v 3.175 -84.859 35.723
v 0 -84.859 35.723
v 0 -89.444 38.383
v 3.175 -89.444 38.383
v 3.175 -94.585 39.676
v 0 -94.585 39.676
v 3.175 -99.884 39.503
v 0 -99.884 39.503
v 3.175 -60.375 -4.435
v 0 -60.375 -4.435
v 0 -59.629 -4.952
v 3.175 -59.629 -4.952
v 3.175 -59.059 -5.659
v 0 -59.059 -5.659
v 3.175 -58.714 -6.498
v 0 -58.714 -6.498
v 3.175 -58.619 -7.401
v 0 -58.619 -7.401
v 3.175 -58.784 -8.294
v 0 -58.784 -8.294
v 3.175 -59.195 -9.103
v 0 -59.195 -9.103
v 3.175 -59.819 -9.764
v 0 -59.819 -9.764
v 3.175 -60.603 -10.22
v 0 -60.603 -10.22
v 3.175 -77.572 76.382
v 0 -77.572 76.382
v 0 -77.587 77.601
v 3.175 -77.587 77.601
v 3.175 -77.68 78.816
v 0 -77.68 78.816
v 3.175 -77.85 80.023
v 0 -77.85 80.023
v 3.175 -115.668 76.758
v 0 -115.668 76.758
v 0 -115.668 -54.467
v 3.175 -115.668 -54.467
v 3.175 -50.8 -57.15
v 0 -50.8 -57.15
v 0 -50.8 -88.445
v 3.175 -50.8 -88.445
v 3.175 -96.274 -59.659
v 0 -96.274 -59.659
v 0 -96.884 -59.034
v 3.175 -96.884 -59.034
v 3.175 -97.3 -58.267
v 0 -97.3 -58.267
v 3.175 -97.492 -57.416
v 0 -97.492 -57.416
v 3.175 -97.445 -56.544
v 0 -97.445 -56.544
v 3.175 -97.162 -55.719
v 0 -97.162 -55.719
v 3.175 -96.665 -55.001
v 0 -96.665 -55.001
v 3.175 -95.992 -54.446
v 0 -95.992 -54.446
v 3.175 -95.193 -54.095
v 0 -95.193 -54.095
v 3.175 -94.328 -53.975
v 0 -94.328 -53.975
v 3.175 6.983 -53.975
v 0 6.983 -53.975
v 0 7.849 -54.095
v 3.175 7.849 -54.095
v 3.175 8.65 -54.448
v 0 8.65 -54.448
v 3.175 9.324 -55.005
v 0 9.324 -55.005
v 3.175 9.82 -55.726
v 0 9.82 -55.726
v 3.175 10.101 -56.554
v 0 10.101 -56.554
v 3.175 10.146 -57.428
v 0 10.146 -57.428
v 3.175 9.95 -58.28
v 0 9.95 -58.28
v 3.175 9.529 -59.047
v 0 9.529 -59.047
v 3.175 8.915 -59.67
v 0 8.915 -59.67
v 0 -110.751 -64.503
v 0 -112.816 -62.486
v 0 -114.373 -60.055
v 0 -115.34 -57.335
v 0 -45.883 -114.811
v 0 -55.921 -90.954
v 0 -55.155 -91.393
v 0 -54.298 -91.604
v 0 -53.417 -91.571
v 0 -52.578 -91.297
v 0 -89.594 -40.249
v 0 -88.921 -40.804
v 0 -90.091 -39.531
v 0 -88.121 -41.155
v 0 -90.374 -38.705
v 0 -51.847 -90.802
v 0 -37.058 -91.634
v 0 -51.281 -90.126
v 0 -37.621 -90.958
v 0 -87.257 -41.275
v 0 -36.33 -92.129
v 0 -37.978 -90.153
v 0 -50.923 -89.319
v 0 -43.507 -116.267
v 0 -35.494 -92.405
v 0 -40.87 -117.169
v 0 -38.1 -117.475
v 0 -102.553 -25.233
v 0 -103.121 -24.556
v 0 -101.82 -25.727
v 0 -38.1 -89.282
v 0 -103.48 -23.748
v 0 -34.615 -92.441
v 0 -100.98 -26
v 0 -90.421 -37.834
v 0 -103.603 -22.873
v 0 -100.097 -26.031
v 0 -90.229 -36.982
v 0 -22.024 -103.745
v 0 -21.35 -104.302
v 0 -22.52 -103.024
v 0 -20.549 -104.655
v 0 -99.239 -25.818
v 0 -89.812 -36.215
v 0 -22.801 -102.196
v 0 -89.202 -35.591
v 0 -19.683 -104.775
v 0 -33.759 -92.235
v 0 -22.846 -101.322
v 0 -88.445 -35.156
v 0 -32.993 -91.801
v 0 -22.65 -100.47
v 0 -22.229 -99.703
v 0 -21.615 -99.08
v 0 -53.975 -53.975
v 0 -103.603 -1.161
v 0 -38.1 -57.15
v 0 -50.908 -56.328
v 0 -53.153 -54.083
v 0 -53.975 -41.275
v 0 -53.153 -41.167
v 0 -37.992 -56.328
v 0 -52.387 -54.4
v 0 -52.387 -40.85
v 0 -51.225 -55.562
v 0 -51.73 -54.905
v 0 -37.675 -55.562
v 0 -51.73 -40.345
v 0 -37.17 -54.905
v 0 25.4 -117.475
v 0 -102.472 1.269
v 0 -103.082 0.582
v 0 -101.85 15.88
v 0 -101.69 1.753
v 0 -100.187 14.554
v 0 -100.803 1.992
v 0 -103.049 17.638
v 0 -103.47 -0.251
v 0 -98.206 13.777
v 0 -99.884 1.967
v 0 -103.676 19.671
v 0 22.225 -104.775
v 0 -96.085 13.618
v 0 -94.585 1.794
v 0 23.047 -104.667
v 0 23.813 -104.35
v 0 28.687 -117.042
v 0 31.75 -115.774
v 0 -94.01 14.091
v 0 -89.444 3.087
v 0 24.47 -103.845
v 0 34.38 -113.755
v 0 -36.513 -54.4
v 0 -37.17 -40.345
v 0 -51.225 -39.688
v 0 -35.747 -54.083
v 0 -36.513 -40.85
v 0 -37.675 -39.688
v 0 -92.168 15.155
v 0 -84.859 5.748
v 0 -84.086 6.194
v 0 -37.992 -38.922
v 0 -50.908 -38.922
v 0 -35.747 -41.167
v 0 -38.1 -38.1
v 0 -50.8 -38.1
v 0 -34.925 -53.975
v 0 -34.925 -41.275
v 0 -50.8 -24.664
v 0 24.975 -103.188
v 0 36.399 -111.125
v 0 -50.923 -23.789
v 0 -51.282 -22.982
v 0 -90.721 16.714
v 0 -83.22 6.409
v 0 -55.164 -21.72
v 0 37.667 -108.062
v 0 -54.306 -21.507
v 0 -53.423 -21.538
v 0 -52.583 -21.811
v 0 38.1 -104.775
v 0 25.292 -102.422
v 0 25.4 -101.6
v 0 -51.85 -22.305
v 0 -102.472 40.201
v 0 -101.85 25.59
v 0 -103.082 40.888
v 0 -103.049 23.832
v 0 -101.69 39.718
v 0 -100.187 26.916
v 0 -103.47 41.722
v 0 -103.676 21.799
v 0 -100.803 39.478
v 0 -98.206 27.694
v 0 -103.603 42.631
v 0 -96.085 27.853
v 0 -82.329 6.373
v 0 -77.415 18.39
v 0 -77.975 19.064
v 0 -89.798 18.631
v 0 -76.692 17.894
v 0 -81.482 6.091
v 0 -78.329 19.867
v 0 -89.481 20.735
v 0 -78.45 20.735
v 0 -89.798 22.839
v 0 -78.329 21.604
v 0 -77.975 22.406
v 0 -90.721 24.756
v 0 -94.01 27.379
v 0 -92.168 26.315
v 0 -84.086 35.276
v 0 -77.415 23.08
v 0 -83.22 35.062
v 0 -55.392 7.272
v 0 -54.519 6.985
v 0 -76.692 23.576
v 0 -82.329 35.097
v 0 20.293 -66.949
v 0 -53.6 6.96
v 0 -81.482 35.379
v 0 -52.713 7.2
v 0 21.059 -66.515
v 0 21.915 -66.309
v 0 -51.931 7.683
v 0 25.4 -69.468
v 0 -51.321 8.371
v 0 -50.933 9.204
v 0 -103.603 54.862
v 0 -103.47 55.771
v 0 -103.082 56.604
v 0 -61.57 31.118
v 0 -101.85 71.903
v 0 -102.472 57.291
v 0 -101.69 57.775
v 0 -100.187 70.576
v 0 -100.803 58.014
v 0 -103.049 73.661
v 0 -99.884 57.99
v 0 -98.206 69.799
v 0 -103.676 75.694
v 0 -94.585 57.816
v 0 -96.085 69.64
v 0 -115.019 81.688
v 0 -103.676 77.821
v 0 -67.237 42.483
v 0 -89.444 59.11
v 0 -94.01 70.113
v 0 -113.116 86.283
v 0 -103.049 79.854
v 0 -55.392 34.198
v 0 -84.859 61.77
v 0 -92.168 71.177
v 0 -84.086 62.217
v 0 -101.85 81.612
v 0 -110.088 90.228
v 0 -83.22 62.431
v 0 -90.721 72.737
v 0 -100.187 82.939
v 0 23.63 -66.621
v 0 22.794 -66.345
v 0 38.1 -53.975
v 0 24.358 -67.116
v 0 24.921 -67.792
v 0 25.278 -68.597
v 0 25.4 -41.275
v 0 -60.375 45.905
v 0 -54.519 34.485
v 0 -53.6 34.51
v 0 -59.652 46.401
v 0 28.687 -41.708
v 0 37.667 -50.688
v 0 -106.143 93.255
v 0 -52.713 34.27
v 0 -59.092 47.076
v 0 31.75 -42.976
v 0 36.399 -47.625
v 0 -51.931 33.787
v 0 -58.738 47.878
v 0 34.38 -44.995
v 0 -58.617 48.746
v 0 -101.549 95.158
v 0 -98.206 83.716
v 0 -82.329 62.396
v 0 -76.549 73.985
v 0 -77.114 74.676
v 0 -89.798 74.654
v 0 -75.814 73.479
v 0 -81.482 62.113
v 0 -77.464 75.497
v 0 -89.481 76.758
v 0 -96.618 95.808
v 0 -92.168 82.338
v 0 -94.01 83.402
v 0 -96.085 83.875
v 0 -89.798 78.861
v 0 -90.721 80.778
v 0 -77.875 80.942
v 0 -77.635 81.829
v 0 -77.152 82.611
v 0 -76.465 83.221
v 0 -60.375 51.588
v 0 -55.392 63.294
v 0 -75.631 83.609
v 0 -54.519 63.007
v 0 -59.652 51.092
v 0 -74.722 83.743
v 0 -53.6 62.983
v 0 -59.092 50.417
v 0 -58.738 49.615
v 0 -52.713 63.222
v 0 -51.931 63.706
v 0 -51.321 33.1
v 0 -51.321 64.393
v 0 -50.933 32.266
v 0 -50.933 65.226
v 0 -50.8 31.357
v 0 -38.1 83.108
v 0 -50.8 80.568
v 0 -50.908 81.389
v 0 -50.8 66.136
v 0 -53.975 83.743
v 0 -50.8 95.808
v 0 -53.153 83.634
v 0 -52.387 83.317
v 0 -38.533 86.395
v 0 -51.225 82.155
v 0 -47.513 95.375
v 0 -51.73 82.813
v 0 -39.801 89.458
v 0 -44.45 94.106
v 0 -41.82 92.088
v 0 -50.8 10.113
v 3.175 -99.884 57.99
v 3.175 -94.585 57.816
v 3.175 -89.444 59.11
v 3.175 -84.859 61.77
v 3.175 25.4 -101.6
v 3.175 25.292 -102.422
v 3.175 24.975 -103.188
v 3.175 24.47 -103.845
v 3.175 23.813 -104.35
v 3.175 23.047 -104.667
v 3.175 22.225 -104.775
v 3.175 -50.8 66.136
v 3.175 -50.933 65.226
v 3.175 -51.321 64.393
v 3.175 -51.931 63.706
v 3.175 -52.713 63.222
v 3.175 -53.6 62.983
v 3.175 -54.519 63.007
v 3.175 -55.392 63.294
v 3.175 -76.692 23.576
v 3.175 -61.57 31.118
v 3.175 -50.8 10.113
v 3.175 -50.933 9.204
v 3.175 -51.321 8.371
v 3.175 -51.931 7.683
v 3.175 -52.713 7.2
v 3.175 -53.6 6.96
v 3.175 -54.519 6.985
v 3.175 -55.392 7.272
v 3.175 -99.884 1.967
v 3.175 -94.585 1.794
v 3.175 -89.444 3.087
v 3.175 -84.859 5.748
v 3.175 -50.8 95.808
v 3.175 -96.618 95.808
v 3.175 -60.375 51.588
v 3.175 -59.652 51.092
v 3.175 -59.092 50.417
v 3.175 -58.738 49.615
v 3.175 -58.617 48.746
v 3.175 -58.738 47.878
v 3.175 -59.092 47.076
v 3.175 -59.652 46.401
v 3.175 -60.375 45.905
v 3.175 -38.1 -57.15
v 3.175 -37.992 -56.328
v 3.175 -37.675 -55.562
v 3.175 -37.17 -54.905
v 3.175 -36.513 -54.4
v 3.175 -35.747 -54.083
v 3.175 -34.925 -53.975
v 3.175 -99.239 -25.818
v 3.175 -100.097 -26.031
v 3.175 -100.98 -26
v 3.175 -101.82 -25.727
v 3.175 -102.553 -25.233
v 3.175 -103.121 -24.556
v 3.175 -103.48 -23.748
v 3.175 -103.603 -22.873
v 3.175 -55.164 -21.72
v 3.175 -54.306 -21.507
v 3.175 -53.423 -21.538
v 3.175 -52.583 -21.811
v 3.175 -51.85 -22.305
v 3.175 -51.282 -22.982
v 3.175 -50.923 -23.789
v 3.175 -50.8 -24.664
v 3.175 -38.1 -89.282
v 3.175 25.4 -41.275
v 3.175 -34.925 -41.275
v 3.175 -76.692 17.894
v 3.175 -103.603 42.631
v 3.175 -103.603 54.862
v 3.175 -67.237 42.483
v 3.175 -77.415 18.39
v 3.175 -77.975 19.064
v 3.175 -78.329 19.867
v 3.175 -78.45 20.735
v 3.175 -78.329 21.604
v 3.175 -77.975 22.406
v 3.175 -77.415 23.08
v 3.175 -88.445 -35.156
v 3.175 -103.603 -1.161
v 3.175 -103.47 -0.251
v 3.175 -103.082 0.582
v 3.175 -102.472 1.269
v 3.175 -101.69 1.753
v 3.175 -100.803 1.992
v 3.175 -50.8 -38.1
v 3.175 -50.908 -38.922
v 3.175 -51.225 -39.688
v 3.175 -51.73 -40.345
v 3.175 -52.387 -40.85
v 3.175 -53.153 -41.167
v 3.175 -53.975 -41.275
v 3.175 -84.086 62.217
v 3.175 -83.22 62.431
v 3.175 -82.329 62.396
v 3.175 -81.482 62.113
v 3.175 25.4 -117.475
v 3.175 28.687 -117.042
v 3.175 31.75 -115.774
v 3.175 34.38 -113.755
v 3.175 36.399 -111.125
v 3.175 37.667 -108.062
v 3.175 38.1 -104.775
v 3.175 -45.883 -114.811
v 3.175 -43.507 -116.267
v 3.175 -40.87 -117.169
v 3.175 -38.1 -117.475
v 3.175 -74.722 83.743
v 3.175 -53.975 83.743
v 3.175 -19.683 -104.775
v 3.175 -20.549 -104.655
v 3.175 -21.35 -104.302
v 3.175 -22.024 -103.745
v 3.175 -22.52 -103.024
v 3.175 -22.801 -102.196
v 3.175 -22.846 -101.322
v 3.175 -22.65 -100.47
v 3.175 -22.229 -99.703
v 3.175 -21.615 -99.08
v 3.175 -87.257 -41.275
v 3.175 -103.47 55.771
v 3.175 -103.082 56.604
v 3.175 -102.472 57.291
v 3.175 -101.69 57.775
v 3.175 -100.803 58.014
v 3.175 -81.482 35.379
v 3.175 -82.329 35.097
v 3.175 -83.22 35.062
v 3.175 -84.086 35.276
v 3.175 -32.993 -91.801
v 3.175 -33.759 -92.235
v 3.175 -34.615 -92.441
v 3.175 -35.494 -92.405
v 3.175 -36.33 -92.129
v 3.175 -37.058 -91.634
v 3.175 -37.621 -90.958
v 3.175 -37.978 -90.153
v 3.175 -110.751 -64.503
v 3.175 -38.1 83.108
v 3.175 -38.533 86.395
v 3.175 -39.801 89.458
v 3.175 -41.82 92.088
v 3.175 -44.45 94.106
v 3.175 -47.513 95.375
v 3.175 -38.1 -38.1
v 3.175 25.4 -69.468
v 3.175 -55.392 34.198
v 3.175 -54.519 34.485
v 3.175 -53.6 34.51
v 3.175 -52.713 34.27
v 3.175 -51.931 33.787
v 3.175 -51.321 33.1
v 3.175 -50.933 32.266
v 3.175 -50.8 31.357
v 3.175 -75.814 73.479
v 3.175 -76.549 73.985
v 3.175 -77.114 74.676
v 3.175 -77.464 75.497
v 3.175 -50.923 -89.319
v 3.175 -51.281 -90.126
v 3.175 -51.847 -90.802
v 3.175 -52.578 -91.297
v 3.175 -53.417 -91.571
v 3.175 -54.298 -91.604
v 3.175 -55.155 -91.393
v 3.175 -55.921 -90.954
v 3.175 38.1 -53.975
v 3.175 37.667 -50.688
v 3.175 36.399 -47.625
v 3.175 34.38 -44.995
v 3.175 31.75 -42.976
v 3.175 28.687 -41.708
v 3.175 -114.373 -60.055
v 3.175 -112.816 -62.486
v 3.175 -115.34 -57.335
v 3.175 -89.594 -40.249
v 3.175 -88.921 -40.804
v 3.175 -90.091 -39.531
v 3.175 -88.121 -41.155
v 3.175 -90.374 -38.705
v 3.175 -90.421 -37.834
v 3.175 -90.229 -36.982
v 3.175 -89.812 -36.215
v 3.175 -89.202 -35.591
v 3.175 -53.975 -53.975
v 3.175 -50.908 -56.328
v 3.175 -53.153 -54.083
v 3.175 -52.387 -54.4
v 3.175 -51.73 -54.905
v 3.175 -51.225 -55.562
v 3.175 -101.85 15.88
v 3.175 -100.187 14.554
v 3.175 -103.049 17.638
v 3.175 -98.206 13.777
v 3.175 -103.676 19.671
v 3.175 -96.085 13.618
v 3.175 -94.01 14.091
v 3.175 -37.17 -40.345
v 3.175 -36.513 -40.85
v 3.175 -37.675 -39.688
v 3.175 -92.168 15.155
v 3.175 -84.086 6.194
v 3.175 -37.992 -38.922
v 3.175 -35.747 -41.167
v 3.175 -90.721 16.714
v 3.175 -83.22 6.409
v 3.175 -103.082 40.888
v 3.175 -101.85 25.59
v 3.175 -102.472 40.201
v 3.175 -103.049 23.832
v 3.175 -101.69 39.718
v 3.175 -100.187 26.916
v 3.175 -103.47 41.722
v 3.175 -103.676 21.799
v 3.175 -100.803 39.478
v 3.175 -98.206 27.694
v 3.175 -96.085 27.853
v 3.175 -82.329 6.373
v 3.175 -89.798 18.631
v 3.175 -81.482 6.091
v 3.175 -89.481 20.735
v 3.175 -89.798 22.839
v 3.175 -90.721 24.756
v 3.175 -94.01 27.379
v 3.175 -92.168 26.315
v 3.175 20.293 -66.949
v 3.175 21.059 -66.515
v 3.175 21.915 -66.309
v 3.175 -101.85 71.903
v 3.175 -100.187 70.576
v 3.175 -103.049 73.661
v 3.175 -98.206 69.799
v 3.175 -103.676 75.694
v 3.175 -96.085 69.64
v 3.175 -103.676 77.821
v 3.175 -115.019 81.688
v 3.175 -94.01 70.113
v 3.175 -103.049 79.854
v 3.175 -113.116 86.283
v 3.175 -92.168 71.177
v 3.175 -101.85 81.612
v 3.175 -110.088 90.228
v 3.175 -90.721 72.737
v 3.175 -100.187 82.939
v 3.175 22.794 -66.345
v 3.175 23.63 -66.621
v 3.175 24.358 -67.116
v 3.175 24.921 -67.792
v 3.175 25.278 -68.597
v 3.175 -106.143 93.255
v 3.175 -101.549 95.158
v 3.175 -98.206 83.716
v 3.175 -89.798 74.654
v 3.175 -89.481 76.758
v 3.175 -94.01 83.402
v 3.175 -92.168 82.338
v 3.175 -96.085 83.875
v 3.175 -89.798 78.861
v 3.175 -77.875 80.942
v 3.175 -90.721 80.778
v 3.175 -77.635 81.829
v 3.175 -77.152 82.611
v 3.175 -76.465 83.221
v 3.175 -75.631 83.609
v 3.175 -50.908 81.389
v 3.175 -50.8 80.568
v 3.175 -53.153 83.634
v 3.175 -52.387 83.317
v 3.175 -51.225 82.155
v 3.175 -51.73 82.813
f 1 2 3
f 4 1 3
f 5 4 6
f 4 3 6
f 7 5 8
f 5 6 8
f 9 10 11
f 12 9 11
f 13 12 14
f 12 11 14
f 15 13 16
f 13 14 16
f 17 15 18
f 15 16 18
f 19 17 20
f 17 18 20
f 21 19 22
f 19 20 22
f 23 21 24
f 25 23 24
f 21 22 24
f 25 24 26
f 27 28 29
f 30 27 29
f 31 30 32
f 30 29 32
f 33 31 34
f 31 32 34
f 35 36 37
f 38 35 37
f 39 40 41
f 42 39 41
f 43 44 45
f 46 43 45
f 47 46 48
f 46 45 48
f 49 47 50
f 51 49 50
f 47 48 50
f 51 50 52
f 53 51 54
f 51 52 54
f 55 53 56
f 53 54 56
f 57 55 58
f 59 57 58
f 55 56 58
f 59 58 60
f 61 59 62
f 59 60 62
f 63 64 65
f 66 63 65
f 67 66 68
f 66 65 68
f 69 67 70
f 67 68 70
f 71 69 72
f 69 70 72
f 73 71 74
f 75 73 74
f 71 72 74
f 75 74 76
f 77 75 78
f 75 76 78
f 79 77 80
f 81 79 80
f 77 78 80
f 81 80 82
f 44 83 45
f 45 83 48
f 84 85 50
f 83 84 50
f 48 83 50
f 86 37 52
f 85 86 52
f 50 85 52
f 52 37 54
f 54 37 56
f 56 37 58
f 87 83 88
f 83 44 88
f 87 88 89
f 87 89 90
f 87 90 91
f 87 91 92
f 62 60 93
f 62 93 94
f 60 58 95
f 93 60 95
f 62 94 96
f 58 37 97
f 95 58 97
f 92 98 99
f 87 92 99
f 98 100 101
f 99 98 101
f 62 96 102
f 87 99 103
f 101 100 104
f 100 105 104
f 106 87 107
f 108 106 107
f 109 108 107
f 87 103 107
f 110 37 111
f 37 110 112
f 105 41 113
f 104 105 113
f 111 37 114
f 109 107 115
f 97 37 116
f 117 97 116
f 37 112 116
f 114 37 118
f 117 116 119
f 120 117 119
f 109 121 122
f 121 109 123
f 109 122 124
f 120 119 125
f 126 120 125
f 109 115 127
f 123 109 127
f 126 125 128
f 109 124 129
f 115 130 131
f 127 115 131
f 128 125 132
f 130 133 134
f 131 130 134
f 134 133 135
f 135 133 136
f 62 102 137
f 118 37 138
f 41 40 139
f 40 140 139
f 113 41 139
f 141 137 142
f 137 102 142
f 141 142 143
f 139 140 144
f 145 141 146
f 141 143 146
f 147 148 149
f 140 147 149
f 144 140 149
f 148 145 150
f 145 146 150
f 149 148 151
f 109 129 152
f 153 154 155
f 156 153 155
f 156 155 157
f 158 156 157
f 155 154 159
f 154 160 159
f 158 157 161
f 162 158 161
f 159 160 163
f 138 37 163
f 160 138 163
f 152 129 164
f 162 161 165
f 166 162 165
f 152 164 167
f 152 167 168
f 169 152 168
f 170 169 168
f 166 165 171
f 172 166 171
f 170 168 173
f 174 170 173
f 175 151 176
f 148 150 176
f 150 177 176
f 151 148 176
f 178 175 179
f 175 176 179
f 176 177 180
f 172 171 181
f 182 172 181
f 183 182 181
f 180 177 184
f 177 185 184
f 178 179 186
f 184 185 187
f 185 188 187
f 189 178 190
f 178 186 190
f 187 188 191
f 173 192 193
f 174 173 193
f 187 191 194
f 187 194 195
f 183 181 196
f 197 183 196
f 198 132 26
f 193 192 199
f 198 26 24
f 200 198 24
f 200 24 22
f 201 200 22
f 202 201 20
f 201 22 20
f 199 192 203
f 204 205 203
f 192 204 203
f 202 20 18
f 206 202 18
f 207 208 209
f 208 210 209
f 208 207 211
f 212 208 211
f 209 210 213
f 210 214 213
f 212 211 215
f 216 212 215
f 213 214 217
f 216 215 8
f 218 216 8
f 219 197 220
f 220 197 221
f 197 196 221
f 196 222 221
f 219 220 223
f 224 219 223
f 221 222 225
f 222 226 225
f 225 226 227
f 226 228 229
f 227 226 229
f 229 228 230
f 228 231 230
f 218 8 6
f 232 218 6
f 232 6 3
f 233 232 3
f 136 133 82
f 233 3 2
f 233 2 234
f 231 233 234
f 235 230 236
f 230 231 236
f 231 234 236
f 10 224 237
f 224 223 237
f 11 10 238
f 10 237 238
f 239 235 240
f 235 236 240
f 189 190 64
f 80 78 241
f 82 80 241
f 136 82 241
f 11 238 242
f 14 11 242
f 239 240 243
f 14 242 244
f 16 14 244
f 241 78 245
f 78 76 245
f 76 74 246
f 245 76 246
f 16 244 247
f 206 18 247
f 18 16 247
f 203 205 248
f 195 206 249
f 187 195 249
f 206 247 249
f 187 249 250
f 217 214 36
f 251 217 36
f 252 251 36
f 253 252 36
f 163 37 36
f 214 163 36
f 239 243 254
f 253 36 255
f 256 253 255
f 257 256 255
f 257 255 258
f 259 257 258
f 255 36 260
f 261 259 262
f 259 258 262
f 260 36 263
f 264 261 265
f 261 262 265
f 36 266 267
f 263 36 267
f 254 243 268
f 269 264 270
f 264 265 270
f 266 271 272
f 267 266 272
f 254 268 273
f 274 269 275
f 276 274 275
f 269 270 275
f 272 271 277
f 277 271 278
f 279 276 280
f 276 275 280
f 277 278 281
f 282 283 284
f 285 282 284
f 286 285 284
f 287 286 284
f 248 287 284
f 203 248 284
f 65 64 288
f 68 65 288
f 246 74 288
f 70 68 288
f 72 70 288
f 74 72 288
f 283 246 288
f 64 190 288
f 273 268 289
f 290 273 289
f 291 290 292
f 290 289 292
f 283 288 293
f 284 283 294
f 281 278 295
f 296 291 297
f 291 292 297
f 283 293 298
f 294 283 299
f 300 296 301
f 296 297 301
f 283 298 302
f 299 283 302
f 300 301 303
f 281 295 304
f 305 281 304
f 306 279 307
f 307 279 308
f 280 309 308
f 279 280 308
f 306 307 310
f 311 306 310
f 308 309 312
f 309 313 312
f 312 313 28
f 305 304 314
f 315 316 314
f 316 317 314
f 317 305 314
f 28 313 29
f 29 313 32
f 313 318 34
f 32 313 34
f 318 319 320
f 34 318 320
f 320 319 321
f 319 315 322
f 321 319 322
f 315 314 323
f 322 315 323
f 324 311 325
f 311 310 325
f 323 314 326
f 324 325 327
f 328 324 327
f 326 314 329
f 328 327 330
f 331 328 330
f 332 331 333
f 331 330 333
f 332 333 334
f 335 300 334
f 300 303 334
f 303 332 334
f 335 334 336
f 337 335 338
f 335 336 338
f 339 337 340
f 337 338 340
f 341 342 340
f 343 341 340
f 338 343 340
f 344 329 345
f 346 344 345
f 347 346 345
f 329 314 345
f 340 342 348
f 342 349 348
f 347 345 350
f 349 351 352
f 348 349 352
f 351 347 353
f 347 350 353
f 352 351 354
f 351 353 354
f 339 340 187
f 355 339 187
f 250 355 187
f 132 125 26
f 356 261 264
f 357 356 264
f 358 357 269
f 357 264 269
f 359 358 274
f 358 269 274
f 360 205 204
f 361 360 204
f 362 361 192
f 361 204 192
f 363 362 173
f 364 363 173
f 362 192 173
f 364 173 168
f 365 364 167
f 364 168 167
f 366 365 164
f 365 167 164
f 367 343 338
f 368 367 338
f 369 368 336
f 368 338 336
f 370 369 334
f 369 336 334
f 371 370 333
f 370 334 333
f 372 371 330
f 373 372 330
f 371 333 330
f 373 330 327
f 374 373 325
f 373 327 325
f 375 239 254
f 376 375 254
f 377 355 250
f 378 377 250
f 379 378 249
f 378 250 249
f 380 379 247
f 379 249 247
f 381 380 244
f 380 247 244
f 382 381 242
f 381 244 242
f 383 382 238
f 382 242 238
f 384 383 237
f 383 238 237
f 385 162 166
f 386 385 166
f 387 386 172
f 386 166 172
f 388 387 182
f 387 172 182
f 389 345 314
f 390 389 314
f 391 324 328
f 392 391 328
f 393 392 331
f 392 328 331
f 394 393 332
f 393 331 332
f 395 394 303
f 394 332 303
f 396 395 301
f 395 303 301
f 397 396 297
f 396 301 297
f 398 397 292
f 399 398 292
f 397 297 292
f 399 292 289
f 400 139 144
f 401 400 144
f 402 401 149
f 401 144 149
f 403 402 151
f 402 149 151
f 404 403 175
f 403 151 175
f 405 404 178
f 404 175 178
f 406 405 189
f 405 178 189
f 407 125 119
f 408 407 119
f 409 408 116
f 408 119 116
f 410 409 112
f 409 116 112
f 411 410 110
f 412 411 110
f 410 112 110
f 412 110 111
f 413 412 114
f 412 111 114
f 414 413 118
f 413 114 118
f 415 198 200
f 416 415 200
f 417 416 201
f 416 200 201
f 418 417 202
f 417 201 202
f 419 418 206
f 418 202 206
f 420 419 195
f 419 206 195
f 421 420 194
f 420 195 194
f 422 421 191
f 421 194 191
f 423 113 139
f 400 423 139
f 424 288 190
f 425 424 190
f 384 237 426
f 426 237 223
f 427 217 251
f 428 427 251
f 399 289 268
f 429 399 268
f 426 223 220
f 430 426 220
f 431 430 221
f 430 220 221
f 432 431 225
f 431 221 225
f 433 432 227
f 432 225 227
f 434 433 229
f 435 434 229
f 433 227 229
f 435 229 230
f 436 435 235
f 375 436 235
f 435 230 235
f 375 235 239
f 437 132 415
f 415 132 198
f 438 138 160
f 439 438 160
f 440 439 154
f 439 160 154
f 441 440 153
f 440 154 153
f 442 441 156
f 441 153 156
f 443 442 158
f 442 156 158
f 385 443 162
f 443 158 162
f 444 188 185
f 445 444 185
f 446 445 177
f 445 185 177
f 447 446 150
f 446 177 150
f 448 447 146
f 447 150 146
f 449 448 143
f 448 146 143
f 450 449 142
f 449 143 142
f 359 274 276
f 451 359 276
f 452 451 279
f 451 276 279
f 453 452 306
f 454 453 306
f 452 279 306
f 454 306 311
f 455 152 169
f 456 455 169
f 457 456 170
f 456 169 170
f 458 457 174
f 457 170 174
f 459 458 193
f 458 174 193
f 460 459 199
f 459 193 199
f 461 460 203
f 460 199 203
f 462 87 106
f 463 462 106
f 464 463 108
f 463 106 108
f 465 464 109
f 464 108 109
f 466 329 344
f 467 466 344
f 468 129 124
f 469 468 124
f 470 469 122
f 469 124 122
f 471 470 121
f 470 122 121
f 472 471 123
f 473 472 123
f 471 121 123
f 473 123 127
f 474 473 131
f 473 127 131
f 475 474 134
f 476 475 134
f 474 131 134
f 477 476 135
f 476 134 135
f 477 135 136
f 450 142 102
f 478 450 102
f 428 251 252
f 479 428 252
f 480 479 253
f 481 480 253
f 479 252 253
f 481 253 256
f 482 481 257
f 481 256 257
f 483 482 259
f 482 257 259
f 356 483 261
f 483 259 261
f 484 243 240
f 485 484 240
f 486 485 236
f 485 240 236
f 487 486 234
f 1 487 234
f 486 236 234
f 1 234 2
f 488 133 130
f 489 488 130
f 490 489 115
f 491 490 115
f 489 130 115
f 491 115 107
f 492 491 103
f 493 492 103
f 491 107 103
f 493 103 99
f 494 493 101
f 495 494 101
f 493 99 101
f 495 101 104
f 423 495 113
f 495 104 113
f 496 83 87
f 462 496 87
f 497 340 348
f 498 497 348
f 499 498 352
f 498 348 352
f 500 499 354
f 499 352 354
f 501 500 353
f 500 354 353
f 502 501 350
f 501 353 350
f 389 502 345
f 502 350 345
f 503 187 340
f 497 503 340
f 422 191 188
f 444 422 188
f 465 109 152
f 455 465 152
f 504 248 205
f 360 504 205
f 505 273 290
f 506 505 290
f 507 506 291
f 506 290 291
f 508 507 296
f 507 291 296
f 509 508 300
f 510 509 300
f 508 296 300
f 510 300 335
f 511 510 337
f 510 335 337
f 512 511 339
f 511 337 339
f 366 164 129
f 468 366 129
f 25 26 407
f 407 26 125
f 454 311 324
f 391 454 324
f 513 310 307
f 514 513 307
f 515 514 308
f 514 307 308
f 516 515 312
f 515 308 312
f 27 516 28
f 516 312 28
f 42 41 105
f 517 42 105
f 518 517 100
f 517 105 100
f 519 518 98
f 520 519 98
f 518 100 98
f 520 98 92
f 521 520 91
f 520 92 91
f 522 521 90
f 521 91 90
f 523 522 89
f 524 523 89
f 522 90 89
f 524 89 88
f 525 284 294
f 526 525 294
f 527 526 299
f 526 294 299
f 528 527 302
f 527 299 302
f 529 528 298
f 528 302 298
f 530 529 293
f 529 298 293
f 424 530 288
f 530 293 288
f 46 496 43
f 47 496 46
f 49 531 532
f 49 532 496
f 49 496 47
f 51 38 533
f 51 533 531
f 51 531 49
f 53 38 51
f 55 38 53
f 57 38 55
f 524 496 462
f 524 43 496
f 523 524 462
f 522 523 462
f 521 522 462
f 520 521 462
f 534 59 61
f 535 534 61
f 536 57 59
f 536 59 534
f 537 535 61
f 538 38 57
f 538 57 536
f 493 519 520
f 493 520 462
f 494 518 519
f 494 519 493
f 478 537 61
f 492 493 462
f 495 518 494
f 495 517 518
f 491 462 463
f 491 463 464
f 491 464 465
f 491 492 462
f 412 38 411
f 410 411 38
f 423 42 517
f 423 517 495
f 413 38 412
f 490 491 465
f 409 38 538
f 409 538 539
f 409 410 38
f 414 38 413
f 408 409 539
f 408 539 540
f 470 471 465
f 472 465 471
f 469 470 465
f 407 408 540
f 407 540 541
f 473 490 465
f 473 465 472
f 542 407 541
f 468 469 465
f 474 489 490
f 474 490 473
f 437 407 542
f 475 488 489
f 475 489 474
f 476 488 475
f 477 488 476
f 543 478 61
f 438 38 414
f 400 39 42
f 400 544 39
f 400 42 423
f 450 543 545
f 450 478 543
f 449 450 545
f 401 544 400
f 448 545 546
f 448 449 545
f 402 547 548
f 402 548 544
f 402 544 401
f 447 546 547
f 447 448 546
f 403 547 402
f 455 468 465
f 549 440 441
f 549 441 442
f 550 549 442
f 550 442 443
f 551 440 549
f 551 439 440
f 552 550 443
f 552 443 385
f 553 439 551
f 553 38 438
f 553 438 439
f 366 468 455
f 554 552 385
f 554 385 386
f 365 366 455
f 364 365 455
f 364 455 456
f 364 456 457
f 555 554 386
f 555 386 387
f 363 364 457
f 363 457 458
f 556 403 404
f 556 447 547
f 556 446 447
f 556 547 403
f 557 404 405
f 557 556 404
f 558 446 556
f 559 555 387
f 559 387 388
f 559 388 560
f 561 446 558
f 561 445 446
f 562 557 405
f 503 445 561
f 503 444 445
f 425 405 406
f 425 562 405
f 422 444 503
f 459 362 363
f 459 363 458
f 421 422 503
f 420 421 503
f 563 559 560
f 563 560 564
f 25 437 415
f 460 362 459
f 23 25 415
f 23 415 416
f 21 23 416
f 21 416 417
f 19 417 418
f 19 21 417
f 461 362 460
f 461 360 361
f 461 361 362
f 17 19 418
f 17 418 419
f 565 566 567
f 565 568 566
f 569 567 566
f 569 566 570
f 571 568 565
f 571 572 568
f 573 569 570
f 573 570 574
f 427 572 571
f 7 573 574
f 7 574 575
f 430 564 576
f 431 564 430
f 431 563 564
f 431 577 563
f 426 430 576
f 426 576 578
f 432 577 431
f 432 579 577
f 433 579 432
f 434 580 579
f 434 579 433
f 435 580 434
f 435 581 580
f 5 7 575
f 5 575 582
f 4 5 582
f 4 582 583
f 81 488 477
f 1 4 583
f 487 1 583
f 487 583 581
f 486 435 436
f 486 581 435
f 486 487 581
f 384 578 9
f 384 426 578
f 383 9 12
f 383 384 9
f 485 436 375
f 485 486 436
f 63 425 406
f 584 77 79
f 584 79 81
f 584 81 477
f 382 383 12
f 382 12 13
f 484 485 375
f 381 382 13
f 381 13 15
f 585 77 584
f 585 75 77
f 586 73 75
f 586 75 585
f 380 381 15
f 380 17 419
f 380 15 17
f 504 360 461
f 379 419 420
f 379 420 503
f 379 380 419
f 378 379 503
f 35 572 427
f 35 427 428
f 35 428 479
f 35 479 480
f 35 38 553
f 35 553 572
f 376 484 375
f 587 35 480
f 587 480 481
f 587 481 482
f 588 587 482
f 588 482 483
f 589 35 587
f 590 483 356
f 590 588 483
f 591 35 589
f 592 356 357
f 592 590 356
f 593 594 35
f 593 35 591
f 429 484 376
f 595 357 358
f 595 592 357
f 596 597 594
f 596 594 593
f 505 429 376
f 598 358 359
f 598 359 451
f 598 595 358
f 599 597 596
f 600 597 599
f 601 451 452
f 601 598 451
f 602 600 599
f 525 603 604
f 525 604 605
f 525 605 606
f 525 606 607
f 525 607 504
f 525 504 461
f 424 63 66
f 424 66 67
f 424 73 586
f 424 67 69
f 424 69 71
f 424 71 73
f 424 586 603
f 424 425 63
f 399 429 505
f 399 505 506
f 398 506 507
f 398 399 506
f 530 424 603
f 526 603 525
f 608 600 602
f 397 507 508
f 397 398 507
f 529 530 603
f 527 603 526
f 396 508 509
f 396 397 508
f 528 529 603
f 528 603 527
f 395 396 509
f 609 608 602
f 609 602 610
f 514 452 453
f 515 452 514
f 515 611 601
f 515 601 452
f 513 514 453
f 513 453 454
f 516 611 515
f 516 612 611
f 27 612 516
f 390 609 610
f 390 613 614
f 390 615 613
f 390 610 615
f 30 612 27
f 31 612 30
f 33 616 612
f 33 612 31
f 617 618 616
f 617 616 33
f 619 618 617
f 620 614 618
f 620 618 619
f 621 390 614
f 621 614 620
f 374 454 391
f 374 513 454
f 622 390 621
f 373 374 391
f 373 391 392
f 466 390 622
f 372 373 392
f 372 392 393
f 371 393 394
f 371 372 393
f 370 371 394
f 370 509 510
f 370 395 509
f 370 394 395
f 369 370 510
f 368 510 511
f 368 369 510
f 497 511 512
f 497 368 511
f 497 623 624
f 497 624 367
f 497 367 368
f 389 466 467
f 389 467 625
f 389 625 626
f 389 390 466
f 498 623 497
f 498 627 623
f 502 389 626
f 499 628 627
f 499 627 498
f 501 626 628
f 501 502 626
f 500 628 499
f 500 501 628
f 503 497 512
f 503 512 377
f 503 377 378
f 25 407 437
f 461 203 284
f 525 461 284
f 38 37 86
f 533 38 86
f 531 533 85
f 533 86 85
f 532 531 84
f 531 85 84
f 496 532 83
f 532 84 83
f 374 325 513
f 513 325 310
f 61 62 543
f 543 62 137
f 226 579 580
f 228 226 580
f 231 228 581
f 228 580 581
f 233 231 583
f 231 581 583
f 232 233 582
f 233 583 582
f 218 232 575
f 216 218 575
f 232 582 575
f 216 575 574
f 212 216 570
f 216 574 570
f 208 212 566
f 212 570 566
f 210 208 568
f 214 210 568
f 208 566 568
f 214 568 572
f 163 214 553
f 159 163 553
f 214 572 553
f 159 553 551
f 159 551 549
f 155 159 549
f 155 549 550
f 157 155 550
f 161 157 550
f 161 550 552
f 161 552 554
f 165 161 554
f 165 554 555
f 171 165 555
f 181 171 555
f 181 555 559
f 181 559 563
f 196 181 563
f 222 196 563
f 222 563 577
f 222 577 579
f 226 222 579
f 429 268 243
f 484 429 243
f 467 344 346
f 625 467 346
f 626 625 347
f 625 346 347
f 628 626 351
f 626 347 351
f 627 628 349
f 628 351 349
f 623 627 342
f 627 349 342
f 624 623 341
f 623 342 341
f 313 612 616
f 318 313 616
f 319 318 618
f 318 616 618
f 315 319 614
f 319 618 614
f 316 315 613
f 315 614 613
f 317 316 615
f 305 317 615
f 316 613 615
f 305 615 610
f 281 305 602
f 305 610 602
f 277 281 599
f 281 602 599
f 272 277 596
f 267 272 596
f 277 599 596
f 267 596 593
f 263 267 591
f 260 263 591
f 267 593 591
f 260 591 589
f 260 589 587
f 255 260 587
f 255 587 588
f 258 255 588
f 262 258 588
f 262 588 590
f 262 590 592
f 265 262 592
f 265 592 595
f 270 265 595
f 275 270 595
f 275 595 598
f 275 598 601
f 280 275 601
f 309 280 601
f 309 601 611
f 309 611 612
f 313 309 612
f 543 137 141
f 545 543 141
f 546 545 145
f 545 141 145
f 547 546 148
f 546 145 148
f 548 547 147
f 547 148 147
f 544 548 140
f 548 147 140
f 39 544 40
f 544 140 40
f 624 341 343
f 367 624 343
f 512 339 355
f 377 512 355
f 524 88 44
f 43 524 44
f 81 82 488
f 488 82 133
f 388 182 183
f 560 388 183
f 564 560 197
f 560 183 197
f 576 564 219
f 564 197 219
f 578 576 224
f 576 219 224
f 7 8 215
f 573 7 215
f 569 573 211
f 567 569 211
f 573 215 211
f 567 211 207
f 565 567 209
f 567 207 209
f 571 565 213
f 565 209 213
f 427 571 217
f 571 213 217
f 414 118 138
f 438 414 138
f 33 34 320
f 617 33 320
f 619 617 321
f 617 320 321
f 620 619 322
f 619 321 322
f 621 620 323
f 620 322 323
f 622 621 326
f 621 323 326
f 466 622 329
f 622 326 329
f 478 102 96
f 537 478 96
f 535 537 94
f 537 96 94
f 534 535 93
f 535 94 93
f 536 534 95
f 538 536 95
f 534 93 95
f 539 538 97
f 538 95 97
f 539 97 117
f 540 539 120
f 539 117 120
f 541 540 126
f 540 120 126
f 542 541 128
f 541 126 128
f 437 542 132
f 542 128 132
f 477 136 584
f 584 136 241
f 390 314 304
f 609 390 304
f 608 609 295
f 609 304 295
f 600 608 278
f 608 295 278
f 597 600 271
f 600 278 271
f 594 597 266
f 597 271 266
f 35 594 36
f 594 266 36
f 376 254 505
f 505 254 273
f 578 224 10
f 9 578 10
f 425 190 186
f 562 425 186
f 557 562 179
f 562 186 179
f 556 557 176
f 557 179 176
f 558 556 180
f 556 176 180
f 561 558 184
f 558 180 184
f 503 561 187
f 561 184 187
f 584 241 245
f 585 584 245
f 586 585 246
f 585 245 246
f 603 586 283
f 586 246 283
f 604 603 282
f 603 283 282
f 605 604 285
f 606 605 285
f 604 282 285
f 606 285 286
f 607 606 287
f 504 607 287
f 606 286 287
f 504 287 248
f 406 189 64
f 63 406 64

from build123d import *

# Parameters (mm, degrees)
F0_R     = 6.985
F1_DEPTH = 3.175
F3_D     = 14.2748


with BuildPart() as f1:
    # F0 (on Right) → F1 (new body)
    with BuildSketch(Plane.YZ):
        with BuildLine():
            ThreePointArc((38.1, -53.975), (34.3802561211, -44.9947438789), (25.4, -41.275))
            Line((25.4, -41.275), (-34.925, -41.275))
            ThreePointArc((-34.925, -41.275), (-37.1700640303, -40.3450640303), (-38.1, -38.1))
            Line((-38.1, -38.1), (-38.1, 41.275))
            Line((-38.1, 41.275), (-38.1, 47.5751108035))
            Line((-38.1, 47.5751108035), (-38.1, 83.1075017654))
            ThreePointArc((-38.1, 83.1075017654), (-41.8197438789, 92.0877578865), (-50.8, 95.8075017654))
            Line((-50.8, 95.8075017654), (-96.6180321919, 95.8075017654))
            ThreePointArc((-96.6180321919, 95.8075017654), (-110.0884163735, 90.227885947), (-115.6680321919, 76.7575017654))
            Line((-115.6680321919, 76.7575017654), (-115.6680321919, 19.1893243394))
            Line((-115.6680321919, 19.1893243394), (-115.6680321919, -54.4674657519))
            ThreePointArc((-115.6680321919, -54.4674657519), (-114.372733143, -60.0552019855), (-110.7510564099, -64.5031288602))
            Line((-110.7510564099, -64.5031288602), (-45.883024218, -114.8106631083))
            ThreePointArc((-45.883024218, -114.8106631083), (-42.2132151977, -116.7904675622), (-38.1, -117.475))
            Line((-38.1, -117.475), (25.4, -117.475))
            ThreePointArc((25.4, -117.475), (34.3802561211, -113.7552561211), (38.1, -104.775))
            Line((38.1, -104.775), (38.1, -53.975))
        make_face()
        with BuildLine():
            ThreePointArc((-50.8, -88.4454353572), (-52.5780659416, -91.2966105949), (-55.9207560545, -90.9543511342))
            Line((-55.9207560545, -90.9543511342), (-96.2740219927, -59.6589157771))
            ThreePointArc((-96.2740219927, -59.6589157771), (-97.3321328287, -56.1216962006), (-94.3282659382, -53.975))
            Line((-94.3282659382, -53.975), (-53.975, -53.975))
            ThreePointArc((-53.975, -53.975), (-51.7299359697, -54.9049359697), (-50.8, -57.15))
            Line((-50.8, -57.15), (-50.8, -88.4454353572))
        make_face(mode=Mode.SUBTRACT)
        with BuildLine():
            Line((-88.4453191039, -35.1558561059), (-55.1635460576, -21.7200589551))
            ThreePointArc((-55.1635460576, -21.7200589551), (-52.1991915549, -22.0322588212), (-50.8, -24.6642028492))
            Line((-50.8, -24.6642028492), (-50.8, -38.1))
            ThreePointArc((-50.8, -38.1), (-51.7299359697, -40.3450640303), (-53.975, -41.275))
            Line((-53.975, -41.275), (-87.2567730463, -41.275))
            ThreePointArc((-87.2567730463, -41.275), (-90.3735247098, -38.7053792763), (-88.4453191039, -35.1558561059))
        make_face(mode=Mode.SUBTRACT)
        with BuildLine():
            ThreePointArc((-38.1, -57.15), (-37.1700640303, -54.9049359697), (-34.925, -53.975))
            Line((-34.925, -53.975), (6.9827090181, -53.975))
            ThreePointArc((6.9827090181, -53.975), (9.9894060531, -56.1300010097), (8.9145691376, -59.6696312188))
            Line((8.9145691376, -59.6696312188), (-32.9931398805, -91.8012507785))
            ThreePointArc((-32.9931398805, -91.8012507785), (-36.3298076595, -92.1289236249), (-38.1, -89.2816195597))
            Line((-38.1, -89.2816195597), (-38.1, -57.15))
        make_face(mode=Mode.SUBTRACT)
        with BuildLine():
            Line((22.225, -104.775), (-19.6827090181, -104.775))
            ThreePointArc((-19.6827090181, -104.775), (-22.6894060531, -102.6199989903), (-21.6145691376, -99.0803687812))
            Line((-21.6145691376, -99.0803687812), (20.2931398805, -66.9487492215))
            ThreePointArc((20.2931398805, -66.9487492215), (23.6298076595, -66.6210763751), (25.4, -69.4683804403))
            Line((25.4, -69.4683804403), (25.4, -101.6))
            ThreePointArc((25.4, -101.6), (24.4700640303, -103.8450640303), (22.225, -104.775))
        make_face(mode=Mode.SUBTRACT)
        with BuildLine():
            ThreePointArc((-84.8587723654, 5.7476975385), (-83.2201096499, 6.408506351), (-81.481969716, 6.0910896656))
            Line((-81.481969716, 6.0910896656), (-60.3749057725, -4.4348041313))
            ThreePointArc((-60.3749057725, -4.4348041313), (-58.6193026557, -7.4013325865), (-60.6032857265, -10.2202409842))
            Line((-60.6032857265, -10.2202409842), (-99.2394861343, -25.8176116721))
            ThreePointArc((-99.2394861343, -25.8176116721), (-102.203840637, -25.505411806), (-103.6030321919, -22.8734677781))
            Line((-103.6030321919, -22.8734677781), (-103.6030321919, -1.1608908265))
            ThreePointArc((-103.6030321919, -1.1608908265), (-102.4716219082, 1.2689993092), (-99.8837464776, 1.9671082242))
            ThreePointArc((-99.8837464776, 1.9671082242), (-91.969560093, 2.2609528282), (-84.8587723654, 5.7476975385))
        make_face(mode=Mode.SUBTRACT)
        with BuildLine():
            ThreePointArc((-96.8477962041, 27.7163225865), (-91.7608044139, 25.7548199819), (-89.6330321919, 20.7351025284))
            ThreePointArc((-89.6330321919, 20.7351025284), (-91.7608044139, 15.715385075), (-96.8477962041, 13.7538824704))
            ThreePointArc((-96.8477962041, 13.7538824704), (-103.6030321919, 20.7351025284), (-96.8477962041, 27.7163225865))
        make_face(mode=Mode.SUBTRACT)
        with BuildLine():
            Line((-50.8, 31.3570788484), (-50.8, 10.1131262084))
            ThreePointArc((-50.8, 10.1131262084), (-52.304388598, 7.4131849973), (-55.3919260116, 7.2718332496))
            Line((-55.3919260116, 7.2718332496), (-76.6916595751, 17.8938095697))
            ThreePointArc((-76.6916595751, 17.8938095696), (-78.4497335635, 20.7351025284), (-76.6916595751, 23.5763954872))
            Line((-76.6916595751, 23.5763954872), (-61.5697646385, 31.117541927))
            Line((-61.5697646385, 31.117541927), (-55.3919260116, 34.1983718072))
            ThreePointArc((-55.3919260116, 34.1983718072), (-52.304388598, 34.0570200595), (-50.8, 31.3570788484))
        make_face(mode=Mode.SUBTRACT)
        with BuildLine():
            Line((-67.2374686849, 42.4827137621), (-81.481969716, 35.3791153912))
            ThreePointArc((-81.481969716, 35.3791153912), (-83.2201096499, 35.0616987058), (-84.8587723654, 35.7225075184))
            ThreePointArc((-84.8587723654, 35.7225075184), (-91.969560093, 39.2092522286), (-99.8837464776, 39.5030968327))
            ThreePointArc((-99.8837464776, 39.5030968327), (-102.4716219082, 40.2012057477), (-103.6030321919, 42.6310958834))
            Line((-103.6030321919, 42.6310958834), (-103.6030321919, 54.8615084105))
            ThreePointArc((-103.6030321919, 54.8615084105), (-102.4716219082, 57.2913985461), (-99.8837464776, 57.9895074612))
            ThreePointArc((-99.8837464776, 57.9895074612), (-91.969560093, 58.2833520652), (-84.8587723653, 61.7700967755))
            ThreePointArc((-84.8587723654, 61.7700967755), (-83.2201096499, 62.430905588), (-81.481969716, 62.1134889026))
            Line((-81.481969716, 62.1134889026), (-60.3749057725, 51.5875951057))
            ThreePointArc((-60.3749057725, 51.5875951057), (-58.6168317841, 48.7463021469), (-60.3749057725, 45.9050091881))
            Line((-60.3749057725, 45.9050091882), (-67.2374686849, 42.4827137621))
        make_face(mode=Mode.SUBTRACT)
        with Locations((-96.6180321919, 76.7575017654)):
            Circle(F0_R, mode=Mode.SUBTRACT)
        with BuildLine():
            Line((-55.3919260116, 63.2942324866), (-75.8142656696, 73.4786607378))
            ThreePointArc((-75.8142656696, 73.4786607378), (-77.1135956749, 74.6760016746), (-77.5717243057, 76.3824605635))
            ThreePointArc((-77.5717243057, 76.3824605635), (-77.6234503942, 78.209521852), (-77.8500378876, 80.0232160511))
            ThreePointArc((-77.8500378876, 80.0232160511), (-77.1519289726, 82.6110914817), (-74.7220388369, 83.7425017654))
            Line((-74.7220388369, 83.7425017654), (-53.975, 83.7425017654))
            ThreePointArc((-53.975, 83.7425017654), (-51.7299359697, 82.8125657957), (-50.8, 80.5675017654))
            Line((-50.8, 80.5675017654), (-50.8, 66.1355254454))
            ThreePointArc((-50.8, 66.1355254454), (-52.304388598, 63.4355842343), (-55.3919260116, 63.2942324866))
        make_face(mode=Mode.SUBTRACT)
        with Locations((-96.6180321919, 76.7575017654)):
            Circle(F0_R)
    extrude(amount=F1_DEPTH)

    # F3 (through all)
    with Locations(Plane(origin=(0, 0, 0), x_dir=(0, -1, 0), z_dir=(-1, 0, 0))):
        with Locations((96.6180321919, 20.7351025284), (96.6180321919, 76.7575017654)):
            Hole(F3_D / 2)


solid = f1.part
